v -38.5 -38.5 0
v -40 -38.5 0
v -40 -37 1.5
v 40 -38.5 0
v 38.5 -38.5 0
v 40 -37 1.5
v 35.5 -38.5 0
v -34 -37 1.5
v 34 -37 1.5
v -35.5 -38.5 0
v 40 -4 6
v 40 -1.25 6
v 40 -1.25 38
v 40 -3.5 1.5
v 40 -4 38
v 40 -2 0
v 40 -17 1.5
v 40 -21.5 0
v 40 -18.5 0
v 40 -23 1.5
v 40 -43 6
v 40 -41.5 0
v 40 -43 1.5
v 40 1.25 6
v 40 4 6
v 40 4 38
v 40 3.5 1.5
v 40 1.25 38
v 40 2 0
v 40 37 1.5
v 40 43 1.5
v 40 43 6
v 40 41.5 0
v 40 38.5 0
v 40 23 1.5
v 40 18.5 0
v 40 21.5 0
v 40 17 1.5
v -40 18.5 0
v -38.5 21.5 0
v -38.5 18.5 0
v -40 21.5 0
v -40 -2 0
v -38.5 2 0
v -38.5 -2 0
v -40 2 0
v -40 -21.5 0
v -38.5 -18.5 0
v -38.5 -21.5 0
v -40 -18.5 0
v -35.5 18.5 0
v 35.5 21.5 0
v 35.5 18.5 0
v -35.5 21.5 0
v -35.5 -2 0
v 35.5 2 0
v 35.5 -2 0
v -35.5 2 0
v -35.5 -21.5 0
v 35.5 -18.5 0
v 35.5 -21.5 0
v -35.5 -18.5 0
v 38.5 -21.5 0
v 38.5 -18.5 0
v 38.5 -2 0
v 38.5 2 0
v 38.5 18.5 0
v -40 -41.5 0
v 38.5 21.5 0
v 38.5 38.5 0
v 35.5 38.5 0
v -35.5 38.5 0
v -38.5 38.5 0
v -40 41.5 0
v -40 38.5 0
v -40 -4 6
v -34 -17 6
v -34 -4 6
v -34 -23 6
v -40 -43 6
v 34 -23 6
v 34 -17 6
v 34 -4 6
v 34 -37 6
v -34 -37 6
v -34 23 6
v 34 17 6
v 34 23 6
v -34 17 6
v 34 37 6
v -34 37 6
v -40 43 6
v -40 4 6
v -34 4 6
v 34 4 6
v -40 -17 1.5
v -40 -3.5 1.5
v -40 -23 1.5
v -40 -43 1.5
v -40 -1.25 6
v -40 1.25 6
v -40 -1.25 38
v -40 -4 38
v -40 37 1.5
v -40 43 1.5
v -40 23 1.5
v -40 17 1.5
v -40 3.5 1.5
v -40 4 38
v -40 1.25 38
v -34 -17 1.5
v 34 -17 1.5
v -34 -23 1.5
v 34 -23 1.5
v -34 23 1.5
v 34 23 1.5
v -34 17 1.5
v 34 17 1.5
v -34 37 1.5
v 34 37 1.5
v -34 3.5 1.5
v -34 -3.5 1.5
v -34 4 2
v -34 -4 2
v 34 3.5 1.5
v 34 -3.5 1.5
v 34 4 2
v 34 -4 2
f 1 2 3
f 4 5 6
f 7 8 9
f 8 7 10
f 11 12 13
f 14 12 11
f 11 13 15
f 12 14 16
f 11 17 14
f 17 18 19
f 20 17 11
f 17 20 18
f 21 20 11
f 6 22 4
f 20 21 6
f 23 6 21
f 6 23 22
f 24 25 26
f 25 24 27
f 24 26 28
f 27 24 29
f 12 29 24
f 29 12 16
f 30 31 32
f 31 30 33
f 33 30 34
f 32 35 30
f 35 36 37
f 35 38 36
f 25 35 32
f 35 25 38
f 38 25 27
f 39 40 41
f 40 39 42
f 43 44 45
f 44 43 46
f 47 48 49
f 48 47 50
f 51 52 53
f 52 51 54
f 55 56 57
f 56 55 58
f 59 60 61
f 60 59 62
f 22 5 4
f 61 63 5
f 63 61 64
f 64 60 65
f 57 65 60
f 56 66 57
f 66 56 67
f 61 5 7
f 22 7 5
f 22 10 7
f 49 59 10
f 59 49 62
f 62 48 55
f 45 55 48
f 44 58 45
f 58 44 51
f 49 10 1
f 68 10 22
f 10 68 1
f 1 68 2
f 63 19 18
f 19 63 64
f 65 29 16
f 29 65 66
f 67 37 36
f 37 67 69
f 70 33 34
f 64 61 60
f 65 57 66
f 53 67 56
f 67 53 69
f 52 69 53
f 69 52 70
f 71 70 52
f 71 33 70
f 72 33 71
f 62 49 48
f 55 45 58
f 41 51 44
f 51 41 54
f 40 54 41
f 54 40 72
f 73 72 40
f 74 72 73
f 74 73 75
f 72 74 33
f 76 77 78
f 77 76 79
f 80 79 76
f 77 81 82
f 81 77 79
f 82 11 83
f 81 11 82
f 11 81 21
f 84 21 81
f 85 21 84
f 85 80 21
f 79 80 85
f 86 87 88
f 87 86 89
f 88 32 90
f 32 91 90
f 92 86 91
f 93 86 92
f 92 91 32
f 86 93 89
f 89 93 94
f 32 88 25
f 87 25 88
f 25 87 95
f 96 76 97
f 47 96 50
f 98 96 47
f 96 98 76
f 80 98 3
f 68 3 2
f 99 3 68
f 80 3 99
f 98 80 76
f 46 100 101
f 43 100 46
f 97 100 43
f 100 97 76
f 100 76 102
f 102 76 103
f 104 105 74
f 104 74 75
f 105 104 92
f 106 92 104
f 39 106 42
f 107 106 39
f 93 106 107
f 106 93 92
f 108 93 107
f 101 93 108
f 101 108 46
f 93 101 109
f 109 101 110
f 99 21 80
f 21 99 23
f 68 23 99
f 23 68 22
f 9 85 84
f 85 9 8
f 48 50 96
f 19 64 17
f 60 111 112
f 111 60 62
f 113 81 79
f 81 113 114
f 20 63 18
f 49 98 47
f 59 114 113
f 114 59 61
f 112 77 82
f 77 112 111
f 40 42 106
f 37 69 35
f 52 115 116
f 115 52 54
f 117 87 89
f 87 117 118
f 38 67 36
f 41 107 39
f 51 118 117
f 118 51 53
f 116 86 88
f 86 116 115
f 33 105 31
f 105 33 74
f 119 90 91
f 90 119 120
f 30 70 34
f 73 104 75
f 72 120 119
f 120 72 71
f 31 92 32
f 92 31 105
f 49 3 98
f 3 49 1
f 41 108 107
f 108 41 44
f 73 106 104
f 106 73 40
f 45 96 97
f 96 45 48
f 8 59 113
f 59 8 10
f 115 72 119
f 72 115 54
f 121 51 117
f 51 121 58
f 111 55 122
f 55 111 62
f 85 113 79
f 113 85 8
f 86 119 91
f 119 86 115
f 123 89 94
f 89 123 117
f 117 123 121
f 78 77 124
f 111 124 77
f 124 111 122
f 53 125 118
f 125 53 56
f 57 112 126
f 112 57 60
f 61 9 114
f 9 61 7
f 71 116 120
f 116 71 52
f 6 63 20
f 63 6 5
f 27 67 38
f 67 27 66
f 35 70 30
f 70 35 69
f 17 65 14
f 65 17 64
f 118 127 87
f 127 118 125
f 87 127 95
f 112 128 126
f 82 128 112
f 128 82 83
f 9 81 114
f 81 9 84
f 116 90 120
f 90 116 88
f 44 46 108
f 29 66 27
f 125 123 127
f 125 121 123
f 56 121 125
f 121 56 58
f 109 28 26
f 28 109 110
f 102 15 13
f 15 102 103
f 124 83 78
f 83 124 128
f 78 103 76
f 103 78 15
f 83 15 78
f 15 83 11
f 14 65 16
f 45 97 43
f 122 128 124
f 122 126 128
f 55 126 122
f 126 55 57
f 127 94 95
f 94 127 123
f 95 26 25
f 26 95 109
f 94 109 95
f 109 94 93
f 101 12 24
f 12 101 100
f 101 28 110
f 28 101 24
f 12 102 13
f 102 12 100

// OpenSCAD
rw = 6;
rm = 8;
rh = 2.5;
h = 30;

w = 80;

l = 80;

difference() {
    union() {
translate([0,-l/2,0])translate([-w/2,-rw/2,rw])rotate([0,90,0])linear_extrude(w)polygon([[0,0],[rw-rw/4,0],[rw,rw/4],[rw,rw-rw/4],[rw-rw/4,rw],[0,rw]]);

translate([0,-l/4,0])translate([-w/2,-rw/2,rw])rotate([0,90,0])linear_extrude(w)polygon([[0,0],[rw-rw/4,0],[rw,rw/4],[rw,rw-rw/4],[rw-rw/4,rw],[0,rw]]);

translate([0,l/4,0])translate([-w/2,-rw/2,rw])rotate([0,90,0])linear_extrude(w)polygon([[0,0],[rw-rw/4,0],[rw,rw/4],[rw,rw-rw/4],[rw-rw/4,rw],[0,rw]]);

translate([0,l/2,0])translate([-w/2,-rw/2,rw])rotate([0,90,0])linear_extrude(w)polygon([[0,0],[rw-rw/4,0],[rw,rw/4],[rw,rw-rw/4],[rw-rw/4,rw],[0,rw]]);

translate([-w/2+rw,-l/2,rw])rotate([0,90,90])linear_extrude(l)polygon([[0,0],[rw-rw/4,0],[rw,rw/4],[rw,rw-rw/4],[rw-rw/4,rw],[0,rw]]);

translate([w/2,-l/2,rw])rotate([0,90,90])linear_extrude(l)polygon([[0,0],[rw-rw/4,0],[rw,rw/4],[rw,rw-rw/4],[rw-rw/4,rw],[0,rw]]);

translate([0,0,0])translate([-w/2,-rm/2,rm])rotate([0,90.0])linear_extrude(w)polygon([[-h,0],[rm-rm/4,0],[rm,rm/4],[rm,rm-rm/4],[rm-rm/4,rm],[-h,rm]]);
    }
    
    translate([-w/2,-rh/2,rw])cube([w,rh,h+rw]);
}
